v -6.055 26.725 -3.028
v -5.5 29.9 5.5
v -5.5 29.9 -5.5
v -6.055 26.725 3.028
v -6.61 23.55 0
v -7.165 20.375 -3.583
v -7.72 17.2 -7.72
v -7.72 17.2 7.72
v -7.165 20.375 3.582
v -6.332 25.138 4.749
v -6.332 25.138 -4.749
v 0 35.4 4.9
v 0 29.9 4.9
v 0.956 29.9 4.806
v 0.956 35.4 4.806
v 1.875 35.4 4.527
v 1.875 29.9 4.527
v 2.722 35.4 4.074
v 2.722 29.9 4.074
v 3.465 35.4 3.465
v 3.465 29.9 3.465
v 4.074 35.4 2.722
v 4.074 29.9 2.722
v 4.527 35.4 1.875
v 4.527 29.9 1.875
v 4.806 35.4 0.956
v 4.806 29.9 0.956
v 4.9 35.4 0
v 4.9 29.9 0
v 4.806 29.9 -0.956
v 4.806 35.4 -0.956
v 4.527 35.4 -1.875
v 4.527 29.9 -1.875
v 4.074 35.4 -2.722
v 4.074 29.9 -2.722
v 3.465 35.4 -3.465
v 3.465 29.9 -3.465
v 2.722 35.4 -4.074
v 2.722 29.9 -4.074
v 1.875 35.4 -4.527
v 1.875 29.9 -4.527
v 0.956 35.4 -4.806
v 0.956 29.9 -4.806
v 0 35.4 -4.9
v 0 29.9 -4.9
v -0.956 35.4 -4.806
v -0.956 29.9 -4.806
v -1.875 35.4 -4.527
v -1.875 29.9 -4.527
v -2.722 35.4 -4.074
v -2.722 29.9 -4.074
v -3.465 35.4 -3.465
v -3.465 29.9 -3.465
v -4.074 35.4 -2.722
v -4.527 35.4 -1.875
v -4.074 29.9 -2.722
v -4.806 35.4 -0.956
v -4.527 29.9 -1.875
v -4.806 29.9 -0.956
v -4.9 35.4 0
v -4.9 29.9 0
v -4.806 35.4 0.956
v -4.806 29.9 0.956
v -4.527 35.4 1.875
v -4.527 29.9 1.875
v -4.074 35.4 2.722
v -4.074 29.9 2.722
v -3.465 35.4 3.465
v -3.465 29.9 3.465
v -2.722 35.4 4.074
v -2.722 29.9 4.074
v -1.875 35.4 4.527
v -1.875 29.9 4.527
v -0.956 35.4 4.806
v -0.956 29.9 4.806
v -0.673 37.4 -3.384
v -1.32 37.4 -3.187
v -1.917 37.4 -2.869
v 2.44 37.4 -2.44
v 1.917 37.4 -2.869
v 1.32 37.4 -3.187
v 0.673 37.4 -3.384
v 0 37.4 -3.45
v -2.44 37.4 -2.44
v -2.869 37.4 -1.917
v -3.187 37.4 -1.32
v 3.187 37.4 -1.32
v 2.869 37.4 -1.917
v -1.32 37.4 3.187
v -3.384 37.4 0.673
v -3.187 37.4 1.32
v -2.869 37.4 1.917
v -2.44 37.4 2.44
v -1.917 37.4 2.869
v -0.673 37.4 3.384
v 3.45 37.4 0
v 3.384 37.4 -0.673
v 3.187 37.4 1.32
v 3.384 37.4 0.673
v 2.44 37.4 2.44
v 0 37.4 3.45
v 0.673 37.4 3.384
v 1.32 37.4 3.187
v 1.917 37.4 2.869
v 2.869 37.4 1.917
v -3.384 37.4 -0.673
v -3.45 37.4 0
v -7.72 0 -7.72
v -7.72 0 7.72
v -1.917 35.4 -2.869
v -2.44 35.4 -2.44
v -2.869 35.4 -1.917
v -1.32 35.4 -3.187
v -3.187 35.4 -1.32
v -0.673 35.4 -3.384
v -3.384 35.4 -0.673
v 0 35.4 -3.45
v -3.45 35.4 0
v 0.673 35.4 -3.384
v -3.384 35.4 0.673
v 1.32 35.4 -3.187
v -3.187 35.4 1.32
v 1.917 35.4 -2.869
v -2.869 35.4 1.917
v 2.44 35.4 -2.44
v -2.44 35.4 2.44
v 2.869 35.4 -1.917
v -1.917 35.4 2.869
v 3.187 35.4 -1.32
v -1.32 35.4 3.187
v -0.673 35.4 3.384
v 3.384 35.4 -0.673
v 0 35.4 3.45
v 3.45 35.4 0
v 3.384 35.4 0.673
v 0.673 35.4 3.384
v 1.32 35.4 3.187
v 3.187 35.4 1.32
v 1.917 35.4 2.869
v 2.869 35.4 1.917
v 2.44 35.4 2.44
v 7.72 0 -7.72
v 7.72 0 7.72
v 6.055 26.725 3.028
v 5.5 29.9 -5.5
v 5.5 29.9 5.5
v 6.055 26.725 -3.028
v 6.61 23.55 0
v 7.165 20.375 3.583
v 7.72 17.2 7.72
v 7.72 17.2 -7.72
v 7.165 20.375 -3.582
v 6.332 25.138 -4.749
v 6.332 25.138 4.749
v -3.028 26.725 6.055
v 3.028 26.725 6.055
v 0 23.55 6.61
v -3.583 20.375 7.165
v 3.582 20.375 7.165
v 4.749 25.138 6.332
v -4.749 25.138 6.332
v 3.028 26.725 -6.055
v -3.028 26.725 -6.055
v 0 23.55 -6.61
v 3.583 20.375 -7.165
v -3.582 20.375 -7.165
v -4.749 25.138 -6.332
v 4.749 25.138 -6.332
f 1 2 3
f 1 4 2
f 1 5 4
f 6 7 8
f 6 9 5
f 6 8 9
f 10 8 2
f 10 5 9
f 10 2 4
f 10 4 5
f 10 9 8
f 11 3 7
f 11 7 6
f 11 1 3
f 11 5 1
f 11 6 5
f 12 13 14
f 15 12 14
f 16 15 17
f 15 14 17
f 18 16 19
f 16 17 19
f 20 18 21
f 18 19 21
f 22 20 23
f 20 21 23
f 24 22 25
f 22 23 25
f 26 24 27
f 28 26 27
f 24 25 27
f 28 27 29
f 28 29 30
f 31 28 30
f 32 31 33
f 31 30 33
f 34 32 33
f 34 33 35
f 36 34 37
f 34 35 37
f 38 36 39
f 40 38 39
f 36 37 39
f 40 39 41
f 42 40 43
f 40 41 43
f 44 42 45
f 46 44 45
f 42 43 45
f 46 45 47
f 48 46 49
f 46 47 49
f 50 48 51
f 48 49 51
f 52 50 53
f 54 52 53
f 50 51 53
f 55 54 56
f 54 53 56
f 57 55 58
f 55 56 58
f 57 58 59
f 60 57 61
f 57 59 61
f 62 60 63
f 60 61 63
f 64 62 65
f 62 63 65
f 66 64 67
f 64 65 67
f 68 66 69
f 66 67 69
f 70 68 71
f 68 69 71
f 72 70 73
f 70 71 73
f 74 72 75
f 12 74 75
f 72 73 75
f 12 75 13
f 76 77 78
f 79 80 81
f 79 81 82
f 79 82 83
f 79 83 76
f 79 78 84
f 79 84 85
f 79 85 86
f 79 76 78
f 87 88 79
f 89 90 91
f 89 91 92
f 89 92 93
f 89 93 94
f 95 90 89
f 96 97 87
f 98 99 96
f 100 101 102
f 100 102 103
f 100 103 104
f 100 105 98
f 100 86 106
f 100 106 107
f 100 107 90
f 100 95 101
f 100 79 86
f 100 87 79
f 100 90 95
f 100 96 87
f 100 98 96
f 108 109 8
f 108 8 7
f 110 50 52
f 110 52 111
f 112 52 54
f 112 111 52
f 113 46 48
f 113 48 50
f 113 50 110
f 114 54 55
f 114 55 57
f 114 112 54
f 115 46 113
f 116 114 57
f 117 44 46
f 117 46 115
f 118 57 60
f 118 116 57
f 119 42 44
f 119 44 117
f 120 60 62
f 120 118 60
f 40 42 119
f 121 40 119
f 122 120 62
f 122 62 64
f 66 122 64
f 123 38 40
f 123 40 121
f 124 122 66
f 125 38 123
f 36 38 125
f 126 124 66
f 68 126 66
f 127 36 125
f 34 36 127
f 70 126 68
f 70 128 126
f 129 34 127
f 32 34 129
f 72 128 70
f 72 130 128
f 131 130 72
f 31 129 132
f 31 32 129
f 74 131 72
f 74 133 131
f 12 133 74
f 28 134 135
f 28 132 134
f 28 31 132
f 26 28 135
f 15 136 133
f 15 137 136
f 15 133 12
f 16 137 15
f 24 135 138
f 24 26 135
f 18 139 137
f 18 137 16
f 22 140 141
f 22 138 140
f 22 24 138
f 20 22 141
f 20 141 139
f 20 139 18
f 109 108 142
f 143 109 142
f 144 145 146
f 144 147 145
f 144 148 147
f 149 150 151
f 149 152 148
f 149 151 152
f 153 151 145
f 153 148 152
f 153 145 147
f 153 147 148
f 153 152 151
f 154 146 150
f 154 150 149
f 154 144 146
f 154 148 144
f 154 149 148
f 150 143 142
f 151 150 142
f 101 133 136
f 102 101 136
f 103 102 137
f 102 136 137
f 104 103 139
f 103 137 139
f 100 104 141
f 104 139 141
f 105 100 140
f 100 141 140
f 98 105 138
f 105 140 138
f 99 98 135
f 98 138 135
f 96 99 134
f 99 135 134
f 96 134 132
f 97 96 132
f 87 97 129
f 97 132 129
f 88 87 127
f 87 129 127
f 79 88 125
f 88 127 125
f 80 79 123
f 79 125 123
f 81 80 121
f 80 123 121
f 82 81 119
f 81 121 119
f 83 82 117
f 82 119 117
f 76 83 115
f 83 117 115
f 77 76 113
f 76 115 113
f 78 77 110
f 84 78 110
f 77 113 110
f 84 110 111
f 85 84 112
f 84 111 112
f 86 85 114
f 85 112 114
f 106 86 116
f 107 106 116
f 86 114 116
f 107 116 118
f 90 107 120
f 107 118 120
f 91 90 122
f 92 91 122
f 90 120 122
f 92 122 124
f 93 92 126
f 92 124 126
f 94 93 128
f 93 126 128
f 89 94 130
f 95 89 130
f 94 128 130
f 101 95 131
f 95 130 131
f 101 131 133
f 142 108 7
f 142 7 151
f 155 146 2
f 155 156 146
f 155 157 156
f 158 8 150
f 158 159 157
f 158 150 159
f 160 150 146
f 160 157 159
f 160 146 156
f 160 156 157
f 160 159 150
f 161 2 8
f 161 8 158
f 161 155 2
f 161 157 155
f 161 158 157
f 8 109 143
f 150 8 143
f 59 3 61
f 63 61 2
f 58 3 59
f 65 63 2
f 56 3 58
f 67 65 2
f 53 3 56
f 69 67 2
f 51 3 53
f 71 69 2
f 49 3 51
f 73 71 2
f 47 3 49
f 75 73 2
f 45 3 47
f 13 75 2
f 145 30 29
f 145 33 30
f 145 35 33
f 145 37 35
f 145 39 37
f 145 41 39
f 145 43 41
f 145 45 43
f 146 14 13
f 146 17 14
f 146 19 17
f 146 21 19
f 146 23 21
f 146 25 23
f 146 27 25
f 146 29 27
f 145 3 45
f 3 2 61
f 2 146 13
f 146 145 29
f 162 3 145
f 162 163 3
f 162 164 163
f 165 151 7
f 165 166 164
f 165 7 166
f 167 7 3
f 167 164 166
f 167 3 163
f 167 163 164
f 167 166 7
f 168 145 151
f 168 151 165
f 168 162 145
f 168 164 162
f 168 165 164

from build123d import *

# Parameters (mm, degrees)
SKETCH_1_W      = 15.44
SKETCH_1_H      = 15.44
EXTRUDE_1_DEPTH = 17.2
SKETCH_3_R      = 4.9
EXTRUDE_2_DEPTH = 5.5
SKETCH_4_R      = 3.45
EXTRUDE_3_DEPTH = 2


with BuildPart() as part:
    # Эскиз1 → Бобышка-Вытянуть1 (new body)
    with BuildSketch(Plane(origin=(0, 0, 0), x_dir=(1, 0, 0), z_dir=(0, 1, 0))):
        Rectangle(SKETCH_1_W, SKETCH_1_H)
    extrude(amount=EXTRUDE_1_DEPTH)

    # Эскиз2 → section 0 of loft_1
    with BuildSketch(Plane(origin=(0, 29.9, 0), x_dir=(1, 0, 0), z_dir=(0, 1, 0)), mode=Mode.PRIVATE) as loft_1_s0:
        with BuildLine():
            Line((-5.5, 5.5), (5.5, 5.5))
            Line((5.5, 5.5), (5.5, -5.5))
            Line((5.5, -5.5), (-5.5, -5.5))
            Line((-5.5, -5.5), (-5.5, 5.5))
        make_face()
    # loft up to a face of the part (loft_1)
    loft([loft_1_s0.sketch, part.faces().sort_by_distance((0, 17.2, 0))[0]])

    # Эскиз3 → Бобышка-Вытянуть2 (add)
    with BuildSketch(Plane(origin=(0, 29.9, 0), x_dir=(1, 0, 0), z_dir=(0, 1, 0))):
        with Locations(Location((0, 0, 0), (0, 0, 270))):
            Circle(SKETCH_3_R)
    extrude(amount=EXTRUDE_2_DEPTH)

    # Эскиз4 → Бобышка-Вытянуть3 (add)
    with BuildSketch(Plane(origin=(0, 35.4, 0), x_dir=(1, 0, 0), z_dir=(0, 1, 0))):
        with Locations(Location((0, 0, 0), (0, 0, 270))):
            Circle(SKETCH_4_R)
    extrude(amount=EXTRUDE_3_DEPTH)


solid = part.part
